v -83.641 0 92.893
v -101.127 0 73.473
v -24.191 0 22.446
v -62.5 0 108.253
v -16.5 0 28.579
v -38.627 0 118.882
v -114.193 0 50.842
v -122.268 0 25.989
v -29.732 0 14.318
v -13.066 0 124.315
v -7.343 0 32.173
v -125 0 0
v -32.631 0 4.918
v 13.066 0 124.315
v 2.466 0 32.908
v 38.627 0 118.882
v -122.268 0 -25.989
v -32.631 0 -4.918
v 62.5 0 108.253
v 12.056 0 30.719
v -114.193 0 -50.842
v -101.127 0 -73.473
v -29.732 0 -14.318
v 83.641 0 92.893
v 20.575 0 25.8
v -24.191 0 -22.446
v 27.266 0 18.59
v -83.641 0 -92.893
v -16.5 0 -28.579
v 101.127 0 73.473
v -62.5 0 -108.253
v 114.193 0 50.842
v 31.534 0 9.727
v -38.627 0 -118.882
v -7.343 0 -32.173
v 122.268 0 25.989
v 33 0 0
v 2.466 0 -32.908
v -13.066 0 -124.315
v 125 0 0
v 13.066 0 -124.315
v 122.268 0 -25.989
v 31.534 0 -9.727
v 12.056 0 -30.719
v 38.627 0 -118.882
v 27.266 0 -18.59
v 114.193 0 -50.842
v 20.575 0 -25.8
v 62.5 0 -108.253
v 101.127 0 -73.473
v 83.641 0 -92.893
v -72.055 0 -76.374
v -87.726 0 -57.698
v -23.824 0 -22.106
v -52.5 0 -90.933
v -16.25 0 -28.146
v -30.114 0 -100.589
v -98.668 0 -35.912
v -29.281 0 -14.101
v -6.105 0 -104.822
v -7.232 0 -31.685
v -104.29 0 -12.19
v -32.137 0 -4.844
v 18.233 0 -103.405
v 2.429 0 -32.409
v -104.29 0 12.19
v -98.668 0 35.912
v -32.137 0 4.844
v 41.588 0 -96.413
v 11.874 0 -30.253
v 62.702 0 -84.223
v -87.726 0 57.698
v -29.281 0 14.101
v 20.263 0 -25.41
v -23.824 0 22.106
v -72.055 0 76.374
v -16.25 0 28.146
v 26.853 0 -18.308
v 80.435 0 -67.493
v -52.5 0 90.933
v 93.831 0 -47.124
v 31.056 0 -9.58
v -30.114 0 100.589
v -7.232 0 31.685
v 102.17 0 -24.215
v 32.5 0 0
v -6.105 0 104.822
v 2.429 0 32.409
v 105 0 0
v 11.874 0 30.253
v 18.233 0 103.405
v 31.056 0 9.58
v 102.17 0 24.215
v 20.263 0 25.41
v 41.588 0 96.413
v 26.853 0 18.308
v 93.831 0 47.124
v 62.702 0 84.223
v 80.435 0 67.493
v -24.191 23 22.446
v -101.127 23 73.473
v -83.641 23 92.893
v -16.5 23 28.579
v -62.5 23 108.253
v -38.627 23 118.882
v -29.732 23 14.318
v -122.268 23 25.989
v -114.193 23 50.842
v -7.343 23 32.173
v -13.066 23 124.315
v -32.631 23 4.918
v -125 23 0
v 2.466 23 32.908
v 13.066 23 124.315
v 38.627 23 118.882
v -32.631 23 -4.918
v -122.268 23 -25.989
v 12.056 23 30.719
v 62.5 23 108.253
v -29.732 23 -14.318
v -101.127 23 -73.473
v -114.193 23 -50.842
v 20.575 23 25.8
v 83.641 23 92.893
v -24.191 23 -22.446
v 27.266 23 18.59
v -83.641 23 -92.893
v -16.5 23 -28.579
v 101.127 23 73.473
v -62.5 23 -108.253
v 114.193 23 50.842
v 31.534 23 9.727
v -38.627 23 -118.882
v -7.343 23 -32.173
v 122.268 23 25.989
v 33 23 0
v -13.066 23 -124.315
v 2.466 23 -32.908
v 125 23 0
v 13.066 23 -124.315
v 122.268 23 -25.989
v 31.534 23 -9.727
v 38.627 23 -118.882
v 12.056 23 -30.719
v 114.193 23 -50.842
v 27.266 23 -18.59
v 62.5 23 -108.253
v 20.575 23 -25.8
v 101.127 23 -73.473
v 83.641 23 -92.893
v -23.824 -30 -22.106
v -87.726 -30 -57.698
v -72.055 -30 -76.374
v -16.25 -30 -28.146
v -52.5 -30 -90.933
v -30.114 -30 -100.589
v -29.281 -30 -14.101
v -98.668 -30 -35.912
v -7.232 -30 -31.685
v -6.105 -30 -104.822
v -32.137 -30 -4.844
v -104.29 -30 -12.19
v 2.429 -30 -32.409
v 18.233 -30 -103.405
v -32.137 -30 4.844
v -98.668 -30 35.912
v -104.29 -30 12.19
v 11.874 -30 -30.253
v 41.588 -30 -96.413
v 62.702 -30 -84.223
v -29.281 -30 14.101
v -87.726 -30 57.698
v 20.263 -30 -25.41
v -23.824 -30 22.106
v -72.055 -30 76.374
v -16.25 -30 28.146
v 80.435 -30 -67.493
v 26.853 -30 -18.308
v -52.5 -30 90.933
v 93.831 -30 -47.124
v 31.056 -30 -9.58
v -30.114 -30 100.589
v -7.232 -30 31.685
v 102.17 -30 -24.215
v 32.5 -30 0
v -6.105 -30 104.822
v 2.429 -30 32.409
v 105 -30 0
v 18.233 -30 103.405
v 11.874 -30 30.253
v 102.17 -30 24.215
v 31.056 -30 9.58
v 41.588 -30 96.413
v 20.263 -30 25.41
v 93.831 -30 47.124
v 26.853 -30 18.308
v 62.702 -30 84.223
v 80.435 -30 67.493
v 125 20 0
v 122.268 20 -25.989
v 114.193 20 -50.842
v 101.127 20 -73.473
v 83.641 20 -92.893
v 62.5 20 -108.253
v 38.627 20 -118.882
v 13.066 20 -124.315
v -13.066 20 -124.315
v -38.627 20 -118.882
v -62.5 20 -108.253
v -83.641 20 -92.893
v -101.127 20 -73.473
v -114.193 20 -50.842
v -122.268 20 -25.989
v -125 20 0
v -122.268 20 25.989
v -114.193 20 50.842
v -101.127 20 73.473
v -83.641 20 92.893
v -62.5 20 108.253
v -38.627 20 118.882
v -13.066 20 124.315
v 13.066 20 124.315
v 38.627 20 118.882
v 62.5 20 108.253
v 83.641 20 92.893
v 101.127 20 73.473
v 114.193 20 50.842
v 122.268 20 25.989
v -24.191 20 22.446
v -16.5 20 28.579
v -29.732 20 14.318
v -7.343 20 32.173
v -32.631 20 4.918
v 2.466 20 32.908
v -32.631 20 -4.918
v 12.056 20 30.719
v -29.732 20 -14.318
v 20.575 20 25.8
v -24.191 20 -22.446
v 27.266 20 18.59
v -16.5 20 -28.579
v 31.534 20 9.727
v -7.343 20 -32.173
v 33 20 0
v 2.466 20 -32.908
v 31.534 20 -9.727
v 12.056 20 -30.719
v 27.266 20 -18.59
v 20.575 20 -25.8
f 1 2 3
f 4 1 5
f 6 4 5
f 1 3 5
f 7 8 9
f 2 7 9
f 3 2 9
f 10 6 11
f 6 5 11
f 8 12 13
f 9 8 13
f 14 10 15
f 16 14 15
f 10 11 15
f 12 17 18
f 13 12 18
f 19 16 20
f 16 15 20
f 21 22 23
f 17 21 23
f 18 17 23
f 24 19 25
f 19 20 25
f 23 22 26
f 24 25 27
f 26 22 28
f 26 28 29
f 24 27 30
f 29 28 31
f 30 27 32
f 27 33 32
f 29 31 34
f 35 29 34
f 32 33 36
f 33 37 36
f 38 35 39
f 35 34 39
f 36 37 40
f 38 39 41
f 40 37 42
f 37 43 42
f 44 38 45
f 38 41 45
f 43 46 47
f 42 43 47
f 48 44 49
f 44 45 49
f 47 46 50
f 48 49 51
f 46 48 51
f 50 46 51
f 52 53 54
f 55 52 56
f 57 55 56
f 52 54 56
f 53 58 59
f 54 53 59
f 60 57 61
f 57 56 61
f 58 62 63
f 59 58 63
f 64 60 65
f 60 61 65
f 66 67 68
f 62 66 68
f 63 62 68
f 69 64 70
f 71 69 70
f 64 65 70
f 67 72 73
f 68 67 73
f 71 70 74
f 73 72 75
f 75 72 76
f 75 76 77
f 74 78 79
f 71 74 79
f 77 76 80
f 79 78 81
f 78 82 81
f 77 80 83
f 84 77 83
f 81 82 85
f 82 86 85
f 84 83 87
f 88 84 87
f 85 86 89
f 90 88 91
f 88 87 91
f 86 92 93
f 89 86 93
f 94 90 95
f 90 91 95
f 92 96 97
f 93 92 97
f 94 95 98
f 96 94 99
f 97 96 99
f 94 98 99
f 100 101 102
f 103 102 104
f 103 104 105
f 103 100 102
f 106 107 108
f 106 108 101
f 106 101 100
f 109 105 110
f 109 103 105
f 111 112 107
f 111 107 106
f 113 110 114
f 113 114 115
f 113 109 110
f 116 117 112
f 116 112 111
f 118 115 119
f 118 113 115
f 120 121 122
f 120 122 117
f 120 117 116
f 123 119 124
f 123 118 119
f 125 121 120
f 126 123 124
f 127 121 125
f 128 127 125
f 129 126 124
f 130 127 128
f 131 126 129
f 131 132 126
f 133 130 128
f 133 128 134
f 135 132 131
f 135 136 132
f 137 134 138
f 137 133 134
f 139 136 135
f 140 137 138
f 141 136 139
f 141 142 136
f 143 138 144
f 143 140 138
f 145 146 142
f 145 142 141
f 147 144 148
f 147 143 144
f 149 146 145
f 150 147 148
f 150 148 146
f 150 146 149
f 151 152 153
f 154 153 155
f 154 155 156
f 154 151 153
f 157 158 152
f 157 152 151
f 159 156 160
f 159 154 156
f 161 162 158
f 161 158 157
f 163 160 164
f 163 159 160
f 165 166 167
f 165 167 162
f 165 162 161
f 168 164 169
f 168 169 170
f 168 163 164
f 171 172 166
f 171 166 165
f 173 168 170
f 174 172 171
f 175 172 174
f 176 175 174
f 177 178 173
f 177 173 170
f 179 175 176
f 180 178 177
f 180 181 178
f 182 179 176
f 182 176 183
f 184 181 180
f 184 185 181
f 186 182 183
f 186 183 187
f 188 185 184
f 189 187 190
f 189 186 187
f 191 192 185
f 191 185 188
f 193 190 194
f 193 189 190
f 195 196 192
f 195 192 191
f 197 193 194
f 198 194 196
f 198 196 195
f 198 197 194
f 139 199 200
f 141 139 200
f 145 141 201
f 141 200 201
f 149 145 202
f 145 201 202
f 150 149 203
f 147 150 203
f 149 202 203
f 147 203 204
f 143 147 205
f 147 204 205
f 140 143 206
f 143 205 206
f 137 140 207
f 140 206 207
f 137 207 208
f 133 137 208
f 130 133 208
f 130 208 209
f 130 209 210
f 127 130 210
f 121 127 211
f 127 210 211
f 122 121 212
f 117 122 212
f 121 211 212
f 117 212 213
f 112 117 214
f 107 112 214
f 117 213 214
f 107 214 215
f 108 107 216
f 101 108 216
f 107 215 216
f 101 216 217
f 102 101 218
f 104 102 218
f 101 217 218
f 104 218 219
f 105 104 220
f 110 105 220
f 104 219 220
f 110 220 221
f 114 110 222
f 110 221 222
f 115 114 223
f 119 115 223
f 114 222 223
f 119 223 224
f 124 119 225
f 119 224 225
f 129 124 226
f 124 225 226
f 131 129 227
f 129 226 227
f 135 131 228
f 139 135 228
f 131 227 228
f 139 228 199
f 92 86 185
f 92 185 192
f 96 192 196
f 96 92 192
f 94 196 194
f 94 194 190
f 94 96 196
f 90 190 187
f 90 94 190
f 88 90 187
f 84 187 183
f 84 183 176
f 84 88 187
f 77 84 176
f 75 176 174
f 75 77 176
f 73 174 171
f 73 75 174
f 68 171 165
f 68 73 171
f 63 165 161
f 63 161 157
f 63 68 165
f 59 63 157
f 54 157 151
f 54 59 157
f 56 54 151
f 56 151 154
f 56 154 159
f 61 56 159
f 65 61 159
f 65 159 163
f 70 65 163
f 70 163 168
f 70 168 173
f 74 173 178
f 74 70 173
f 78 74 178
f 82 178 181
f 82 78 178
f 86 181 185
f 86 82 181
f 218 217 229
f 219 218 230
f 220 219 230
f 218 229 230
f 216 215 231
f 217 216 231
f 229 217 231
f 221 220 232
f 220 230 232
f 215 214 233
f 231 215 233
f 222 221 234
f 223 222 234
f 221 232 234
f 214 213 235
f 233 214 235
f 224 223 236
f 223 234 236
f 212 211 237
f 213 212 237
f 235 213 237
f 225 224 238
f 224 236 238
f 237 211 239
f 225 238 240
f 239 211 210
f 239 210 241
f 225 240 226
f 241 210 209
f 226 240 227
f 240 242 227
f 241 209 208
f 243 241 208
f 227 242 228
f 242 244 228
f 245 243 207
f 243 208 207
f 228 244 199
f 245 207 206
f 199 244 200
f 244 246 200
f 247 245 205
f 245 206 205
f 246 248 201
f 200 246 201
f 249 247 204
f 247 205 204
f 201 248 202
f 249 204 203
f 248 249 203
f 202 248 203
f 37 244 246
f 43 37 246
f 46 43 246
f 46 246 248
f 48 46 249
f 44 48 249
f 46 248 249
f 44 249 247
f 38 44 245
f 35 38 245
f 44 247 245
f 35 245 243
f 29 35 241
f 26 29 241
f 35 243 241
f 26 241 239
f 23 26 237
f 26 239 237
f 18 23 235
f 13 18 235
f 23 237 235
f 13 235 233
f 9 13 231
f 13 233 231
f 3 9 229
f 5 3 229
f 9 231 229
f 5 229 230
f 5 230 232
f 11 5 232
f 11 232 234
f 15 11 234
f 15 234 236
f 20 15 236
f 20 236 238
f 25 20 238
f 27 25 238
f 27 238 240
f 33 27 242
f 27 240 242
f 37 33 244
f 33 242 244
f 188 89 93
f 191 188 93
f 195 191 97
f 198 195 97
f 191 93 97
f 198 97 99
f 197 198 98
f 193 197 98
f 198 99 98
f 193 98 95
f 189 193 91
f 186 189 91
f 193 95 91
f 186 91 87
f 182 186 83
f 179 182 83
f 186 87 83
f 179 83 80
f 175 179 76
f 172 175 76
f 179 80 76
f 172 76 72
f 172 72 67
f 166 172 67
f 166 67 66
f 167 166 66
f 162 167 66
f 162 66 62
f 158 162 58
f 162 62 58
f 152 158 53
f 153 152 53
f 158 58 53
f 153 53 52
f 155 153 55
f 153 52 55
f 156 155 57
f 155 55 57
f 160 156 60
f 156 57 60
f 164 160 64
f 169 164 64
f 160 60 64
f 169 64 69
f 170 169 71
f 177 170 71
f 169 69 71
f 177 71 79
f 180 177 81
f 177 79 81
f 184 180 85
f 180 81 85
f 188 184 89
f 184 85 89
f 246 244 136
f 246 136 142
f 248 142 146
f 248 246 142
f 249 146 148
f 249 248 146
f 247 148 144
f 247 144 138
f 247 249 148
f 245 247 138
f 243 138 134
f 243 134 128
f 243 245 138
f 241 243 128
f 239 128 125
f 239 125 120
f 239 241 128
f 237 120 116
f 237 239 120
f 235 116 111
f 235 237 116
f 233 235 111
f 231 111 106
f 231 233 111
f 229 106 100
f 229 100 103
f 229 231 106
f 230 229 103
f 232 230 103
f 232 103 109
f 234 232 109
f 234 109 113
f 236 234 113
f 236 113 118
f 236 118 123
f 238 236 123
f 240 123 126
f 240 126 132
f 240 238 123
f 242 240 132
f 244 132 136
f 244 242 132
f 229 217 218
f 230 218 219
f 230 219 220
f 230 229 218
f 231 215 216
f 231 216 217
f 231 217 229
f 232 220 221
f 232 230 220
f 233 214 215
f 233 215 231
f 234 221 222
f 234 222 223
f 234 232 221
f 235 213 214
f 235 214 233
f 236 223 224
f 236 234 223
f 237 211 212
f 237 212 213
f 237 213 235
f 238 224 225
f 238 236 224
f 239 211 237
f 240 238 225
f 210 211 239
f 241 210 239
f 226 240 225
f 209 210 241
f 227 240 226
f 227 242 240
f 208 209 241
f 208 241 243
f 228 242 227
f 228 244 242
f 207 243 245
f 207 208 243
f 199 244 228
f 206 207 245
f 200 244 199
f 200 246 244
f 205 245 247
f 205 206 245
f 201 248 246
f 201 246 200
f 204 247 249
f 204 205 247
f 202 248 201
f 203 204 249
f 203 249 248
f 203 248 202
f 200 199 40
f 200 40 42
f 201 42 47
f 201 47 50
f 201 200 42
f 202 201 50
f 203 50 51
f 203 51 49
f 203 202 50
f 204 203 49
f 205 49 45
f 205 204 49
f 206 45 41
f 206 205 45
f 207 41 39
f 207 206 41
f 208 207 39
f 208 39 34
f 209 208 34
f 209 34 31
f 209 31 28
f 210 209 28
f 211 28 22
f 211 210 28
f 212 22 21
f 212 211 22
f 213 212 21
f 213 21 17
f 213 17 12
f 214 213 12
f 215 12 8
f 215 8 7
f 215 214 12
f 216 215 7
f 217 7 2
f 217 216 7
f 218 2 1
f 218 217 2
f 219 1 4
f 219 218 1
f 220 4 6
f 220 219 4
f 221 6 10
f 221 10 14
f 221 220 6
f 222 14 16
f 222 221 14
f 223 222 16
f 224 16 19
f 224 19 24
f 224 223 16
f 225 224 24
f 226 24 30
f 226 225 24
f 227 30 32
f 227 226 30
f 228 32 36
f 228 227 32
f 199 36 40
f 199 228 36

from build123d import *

# Parameters (mm, degrees)
F0_R     = 105
F0_R_2   = 32.5
F1_DEPTH = 30
F3_R     = 125
F3_R_2   = 33
F4_DEPTH = 20
F5_DEPTH = 3


with BuildPart() as f1:
    # F0 (on Front) → F1 (new body)
    with BuildSketch(Plane.XZ):
        Circle(F0_R)
        Circle(F0_R_2, mode=Mode.SUBTRACT)
    extrude(amount=F1_DEPTH)


with BuildPart() as f4:
    # F3 (on offset) → F4 (new body)
    with BuildSketch(Plane(origin=(0, 20, 0), x_dir=(1, 0, 0), z_dir=(0, 1, 0))):
        Circle(F3_R)
        Circle(F3_R_2, mode=Mode.SUBTRACT)
    extrude(amount=-F4_DEPTH)


with BuildPart() as f5:
    # F3 (on offset) → F5 (new body)
    with BuildSketch(Plane(origin=(0, 20, 0), x_dir=(1, 0, 0), z_dir=(0, 1, 0))):
        Circle(F3_R)
        Circle(F3_R_2, mode=Mode.SUBTRACT)
    extrude(amount=F5_DEPTH)


solid = Compound([f1.part, f4.part, f5.part])
